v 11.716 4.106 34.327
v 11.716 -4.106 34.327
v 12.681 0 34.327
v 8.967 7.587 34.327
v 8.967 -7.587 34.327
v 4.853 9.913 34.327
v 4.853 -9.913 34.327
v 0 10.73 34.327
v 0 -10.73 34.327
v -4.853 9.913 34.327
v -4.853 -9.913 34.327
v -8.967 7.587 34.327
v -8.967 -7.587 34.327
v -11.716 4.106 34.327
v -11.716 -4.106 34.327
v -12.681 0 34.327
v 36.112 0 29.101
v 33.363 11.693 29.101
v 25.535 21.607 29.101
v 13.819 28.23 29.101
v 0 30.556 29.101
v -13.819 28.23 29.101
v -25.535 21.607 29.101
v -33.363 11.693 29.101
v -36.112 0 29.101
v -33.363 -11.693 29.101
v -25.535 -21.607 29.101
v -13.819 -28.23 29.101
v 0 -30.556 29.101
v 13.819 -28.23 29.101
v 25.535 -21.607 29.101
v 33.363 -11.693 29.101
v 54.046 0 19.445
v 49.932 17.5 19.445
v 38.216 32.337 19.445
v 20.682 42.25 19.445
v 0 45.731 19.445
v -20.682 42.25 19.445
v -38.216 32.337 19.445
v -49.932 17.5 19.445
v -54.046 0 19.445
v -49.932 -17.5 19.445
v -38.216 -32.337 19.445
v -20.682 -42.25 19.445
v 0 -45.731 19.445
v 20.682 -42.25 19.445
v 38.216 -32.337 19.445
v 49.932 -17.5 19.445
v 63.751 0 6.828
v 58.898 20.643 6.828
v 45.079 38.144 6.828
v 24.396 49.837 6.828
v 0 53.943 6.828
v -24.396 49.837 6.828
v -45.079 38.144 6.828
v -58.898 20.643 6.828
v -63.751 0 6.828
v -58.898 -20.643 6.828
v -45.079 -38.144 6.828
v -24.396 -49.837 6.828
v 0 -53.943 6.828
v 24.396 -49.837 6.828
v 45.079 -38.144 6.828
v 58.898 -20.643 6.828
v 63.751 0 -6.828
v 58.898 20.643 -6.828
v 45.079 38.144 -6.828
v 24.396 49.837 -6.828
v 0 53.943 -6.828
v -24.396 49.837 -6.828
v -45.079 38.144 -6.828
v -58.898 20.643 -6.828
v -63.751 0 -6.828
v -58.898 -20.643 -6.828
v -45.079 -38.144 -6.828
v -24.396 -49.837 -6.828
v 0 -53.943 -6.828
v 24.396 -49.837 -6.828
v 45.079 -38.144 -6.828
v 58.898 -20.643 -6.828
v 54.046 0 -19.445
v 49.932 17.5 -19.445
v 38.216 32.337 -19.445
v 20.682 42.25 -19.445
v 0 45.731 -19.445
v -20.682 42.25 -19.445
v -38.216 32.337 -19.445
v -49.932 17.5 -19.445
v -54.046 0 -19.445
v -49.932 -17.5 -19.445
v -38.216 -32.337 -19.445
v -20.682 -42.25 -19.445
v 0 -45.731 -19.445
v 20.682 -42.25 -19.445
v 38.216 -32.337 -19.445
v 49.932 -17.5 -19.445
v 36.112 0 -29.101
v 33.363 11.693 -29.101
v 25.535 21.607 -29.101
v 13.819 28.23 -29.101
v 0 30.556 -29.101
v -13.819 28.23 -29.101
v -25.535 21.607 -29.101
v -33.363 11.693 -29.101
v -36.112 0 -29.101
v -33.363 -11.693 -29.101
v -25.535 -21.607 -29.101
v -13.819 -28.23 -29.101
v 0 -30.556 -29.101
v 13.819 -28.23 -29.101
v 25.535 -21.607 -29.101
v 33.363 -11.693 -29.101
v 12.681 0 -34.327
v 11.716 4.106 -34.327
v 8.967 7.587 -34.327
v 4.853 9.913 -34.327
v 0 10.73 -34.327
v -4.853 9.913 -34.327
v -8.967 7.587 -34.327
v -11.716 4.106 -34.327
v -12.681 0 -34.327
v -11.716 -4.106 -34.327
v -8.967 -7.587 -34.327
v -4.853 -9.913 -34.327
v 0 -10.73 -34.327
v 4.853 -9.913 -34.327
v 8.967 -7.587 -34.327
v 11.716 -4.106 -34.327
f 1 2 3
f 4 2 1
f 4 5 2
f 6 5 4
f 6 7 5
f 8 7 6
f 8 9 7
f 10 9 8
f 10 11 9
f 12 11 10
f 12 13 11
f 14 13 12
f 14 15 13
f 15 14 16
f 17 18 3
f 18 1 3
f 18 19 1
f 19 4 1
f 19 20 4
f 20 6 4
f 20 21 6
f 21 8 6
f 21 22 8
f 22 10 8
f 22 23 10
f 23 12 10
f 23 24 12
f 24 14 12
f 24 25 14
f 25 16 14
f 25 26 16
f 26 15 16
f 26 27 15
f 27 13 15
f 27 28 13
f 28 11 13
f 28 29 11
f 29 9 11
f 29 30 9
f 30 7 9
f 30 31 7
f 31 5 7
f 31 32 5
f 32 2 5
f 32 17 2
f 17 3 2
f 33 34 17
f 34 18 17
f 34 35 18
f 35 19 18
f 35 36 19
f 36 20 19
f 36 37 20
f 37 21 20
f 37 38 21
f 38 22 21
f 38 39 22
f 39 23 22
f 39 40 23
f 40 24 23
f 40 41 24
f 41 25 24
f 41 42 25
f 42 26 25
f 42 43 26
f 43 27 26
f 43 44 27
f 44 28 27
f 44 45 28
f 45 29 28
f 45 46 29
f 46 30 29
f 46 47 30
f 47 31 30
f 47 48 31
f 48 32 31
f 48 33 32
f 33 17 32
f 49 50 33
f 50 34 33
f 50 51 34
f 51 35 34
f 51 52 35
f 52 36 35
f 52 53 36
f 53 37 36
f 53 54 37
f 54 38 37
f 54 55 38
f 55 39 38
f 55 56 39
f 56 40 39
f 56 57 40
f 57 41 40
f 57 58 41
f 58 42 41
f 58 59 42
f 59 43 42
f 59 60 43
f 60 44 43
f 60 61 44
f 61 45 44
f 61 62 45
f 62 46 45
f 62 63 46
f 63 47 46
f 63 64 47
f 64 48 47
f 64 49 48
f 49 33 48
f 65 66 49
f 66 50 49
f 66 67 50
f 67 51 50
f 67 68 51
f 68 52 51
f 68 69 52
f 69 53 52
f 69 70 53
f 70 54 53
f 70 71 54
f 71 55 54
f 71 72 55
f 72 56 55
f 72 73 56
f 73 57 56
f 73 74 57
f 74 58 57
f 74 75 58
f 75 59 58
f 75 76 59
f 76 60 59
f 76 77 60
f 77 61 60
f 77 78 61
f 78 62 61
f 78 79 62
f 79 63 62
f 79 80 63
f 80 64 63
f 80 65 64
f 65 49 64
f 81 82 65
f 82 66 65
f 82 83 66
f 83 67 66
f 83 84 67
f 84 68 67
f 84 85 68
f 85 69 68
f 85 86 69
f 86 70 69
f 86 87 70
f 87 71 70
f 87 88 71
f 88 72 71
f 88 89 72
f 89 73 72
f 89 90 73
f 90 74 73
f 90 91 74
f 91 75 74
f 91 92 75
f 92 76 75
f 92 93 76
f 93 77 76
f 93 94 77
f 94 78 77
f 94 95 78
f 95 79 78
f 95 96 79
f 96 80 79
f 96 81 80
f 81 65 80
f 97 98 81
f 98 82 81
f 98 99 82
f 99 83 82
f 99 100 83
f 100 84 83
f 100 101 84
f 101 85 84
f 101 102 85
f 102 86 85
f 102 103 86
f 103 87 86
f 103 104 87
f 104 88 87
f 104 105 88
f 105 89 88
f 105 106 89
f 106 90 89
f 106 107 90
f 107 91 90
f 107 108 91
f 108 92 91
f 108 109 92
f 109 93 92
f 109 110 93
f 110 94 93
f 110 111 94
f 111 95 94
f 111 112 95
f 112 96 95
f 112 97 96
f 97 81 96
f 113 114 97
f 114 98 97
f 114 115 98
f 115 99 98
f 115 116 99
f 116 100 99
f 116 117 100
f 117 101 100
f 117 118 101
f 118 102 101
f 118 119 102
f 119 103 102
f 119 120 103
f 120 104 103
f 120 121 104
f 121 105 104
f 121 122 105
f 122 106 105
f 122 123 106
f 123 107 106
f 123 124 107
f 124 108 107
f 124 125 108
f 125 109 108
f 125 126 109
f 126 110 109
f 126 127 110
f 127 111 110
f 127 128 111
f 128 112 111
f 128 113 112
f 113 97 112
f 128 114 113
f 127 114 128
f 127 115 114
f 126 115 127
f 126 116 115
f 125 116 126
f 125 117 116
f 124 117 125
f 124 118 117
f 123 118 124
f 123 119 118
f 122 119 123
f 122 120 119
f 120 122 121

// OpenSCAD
// Generated by SolidPython 1.0.1 on 2020-07-29 00:46:50


scale(v = [13, 11, 7]) {
	sphere(r = 5);
}
/***********************************************
*********      SolidPython code:      **********
************************************************
 
# import packages: SolidPython
from solid import *
from solid.utils import *
from itertools import chain, combinations, permutations


class Resize:

    def __init__(self, scad_file):
        self.scad_file = scad_file
        #self.scad_file = import_scad(scad_file)
        # cone/cylinder param:
        self.r1 = 0
        self.r2 = 0
        self.h = 0
        # rectangular prism param:
        self.w = 0
        self.l = 0
        # ellipse param:
        self.r = 0

    # import OpenScad code (file name corresponds to shape)


    # classify shape + parameters
    def assign(self, param1, param2, param3):
        if self.scad_file == 'cone.scad':
            self.r1 = param1
            self.r2 = param2
            self.h = param3
        elif self.scad_file == 'cylinder.scad':
            self.r1 = param1
            self.r2 = param2
            self.h = param3
        elif self.scad_file == 'rectangularPrism.scad':
            self.h = param1
            self.l = param2
            self.w = param3
        else:
            self.r = param1
            self.h = param2

    # resize parameters
    def iterate(self):
        x = range(3, 20, 2)
        i = 1
        if self.scad_file == 'cone.scad':
            tempList = list(permutations(x, 2))
            for temp in tempList:
                param1 = temp[0]
                param2 = temp[1]
                filepath = 'produced_scad_files/' + 'cone' + str(param1) + '_' + str(param2) + '_' + '.scad'
                scad_render_to_file(cylinder(h=param1, r1=param2, r2=0), filepath)

        elif self.scad_file == 'cylinder.scad':
            tempList = list(permutations(x, 3))
            for temp in tempList:
                param1 = temp[0]
                param2 = temp[1]
                filepath = 'produced_scad_files/' + 'cylinder' + str(param1) + '_' + str(param2) + '_' + '.scad'
                scad_render_to_file(cylinder(h=param1, r1=param2, r2=param2), filepath)

        elif self.scad_file == 'rectangularPrism.scad':
            tempList = list(permutations(x, 3))
            for temp in tempList:
                param1 = temp[0]
                param2 = temp[1]
                param3 = temp[2]
                filepath = 'produced_scad_files/' + 'rectangularPrism' + str(param1) + '_' + str(param2) + '_' + str(
                    param3) + '.scad'
                scad_render_to_file(cube(size=(param1, param2, param3)), filepath)

        elif self.scad_file == 'ellipse.scad':
            tempList = list(permutations(x, 4))
            for temp in tempList:
                param1 = temp[0]
                param2 = temp[1]
                param3 = temp[2]
                param4 = temp[3]
                filepath = 'produced_scad_files/' + 'ellipse' + str(param1) + '_' + str(param2) + '_' + str(param3) + '_' + str(param4) + '.scad'
                scad_render_to_file(scale([param1, param2, param3])(sphere(r=param4)), filepath)

    def render_to_scadfile(self):
        scad_render_to_file(scad, 'example.scad') 
 
************************************************/
